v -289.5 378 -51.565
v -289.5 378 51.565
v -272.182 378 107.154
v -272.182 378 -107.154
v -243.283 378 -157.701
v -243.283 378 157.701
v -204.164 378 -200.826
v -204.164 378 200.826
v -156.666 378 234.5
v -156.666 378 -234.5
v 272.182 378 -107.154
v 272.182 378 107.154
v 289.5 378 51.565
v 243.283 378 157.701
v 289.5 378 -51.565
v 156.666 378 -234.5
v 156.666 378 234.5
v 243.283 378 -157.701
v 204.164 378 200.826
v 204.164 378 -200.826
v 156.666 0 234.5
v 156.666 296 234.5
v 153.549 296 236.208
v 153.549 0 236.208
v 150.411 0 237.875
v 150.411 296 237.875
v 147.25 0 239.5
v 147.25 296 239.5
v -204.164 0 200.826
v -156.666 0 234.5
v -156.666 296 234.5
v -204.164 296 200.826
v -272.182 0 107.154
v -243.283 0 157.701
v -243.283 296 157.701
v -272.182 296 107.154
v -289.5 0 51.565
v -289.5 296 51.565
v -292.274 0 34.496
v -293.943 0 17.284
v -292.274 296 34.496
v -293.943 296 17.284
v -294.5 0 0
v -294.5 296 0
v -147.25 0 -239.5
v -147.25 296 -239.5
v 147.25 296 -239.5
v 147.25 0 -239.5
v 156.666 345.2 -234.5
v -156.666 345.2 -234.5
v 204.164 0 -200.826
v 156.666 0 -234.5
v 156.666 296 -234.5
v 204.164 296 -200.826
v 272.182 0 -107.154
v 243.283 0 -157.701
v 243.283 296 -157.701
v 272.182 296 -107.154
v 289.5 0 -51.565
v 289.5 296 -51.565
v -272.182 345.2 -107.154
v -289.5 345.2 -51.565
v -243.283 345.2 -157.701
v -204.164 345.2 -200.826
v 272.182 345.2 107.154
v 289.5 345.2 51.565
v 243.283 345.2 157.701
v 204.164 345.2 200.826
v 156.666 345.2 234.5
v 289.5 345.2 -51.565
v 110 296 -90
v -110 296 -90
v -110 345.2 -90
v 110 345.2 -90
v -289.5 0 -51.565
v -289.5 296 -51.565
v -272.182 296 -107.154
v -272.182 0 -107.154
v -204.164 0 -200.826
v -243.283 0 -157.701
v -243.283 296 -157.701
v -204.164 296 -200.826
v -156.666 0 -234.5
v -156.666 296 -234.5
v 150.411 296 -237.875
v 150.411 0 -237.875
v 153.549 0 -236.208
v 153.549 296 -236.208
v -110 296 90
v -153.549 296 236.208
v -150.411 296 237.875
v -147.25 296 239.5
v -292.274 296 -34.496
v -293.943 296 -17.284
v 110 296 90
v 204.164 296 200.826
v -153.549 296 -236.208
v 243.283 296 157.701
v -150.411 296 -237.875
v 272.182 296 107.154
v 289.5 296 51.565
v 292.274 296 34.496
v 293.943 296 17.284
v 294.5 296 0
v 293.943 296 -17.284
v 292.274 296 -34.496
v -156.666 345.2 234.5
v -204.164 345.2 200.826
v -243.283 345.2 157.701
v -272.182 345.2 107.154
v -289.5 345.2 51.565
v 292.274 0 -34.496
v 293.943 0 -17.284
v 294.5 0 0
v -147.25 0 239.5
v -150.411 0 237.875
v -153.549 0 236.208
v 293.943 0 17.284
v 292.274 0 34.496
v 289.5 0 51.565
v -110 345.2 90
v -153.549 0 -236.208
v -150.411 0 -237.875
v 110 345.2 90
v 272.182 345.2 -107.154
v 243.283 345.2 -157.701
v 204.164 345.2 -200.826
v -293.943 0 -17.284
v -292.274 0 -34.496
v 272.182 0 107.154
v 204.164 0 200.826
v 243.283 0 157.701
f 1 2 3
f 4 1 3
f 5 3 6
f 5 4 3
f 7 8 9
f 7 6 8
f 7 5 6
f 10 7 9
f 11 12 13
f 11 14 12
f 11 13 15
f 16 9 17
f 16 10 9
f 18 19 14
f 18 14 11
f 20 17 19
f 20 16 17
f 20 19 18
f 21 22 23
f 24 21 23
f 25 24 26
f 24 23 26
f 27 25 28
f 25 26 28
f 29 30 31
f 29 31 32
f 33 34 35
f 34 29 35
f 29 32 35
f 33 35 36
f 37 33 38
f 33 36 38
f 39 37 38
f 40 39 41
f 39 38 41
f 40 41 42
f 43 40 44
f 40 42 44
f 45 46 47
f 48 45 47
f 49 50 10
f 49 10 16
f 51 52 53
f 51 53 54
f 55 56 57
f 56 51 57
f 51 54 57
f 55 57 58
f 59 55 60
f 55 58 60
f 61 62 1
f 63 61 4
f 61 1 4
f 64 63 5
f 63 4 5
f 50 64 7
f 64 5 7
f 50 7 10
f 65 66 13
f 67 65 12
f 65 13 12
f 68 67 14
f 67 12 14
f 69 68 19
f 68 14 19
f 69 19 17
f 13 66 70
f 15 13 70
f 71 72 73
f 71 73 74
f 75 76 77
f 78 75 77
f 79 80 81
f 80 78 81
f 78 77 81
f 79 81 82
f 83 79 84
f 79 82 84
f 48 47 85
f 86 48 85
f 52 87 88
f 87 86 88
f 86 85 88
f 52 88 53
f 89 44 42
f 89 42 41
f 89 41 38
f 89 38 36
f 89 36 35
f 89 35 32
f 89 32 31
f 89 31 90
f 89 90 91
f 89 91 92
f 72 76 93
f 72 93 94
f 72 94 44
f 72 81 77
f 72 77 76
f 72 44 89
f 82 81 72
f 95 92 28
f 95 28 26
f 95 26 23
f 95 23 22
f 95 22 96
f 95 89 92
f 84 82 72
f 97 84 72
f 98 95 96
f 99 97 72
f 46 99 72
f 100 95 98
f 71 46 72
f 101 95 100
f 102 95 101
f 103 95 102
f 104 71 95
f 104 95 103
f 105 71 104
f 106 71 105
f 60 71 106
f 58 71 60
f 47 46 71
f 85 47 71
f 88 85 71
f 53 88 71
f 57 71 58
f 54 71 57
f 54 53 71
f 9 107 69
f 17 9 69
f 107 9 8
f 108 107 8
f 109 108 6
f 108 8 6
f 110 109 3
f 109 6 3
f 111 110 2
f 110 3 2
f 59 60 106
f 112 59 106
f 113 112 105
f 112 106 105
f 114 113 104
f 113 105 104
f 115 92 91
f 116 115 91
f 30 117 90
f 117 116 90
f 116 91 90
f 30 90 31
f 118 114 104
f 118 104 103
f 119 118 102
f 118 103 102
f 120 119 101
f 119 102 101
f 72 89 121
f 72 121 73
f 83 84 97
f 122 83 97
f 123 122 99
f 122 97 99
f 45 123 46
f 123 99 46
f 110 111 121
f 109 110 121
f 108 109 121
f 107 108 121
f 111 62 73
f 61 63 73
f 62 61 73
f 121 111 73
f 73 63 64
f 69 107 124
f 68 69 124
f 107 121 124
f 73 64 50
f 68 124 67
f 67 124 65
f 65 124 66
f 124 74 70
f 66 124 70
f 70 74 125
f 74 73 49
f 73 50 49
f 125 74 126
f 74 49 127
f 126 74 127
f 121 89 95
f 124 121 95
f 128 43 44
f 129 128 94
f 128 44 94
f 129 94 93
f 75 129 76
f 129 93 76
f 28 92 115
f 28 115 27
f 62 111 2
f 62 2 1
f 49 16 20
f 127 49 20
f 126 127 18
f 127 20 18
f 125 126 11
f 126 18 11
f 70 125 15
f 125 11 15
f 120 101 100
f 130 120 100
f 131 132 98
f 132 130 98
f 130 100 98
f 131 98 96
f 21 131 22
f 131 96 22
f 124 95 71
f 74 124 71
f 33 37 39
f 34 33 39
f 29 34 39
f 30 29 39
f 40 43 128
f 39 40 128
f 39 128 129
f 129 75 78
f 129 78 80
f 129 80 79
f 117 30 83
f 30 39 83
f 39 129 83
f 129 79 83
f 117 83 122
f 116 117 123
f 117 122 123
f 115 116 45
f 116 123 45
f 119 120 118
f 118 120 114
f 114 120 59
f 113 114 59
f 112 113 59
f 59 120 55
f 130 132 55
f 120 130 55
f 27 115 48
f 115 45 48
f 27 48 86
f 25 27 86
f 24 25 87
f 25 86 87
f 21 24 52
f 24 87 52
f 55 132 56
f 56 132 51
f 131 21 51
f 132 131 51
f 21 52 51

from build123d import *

# Parameters (mm, degrees)
ESBO_O1_W                = 589
ESBO_O1_H                = 479
RESSALTO_EXTRUS_O1_DEPTH = 296
ESBO_O2_W                = 220
ESBO_O2_H                = 180
RESSALTO_EXTRUS_O2_DEPTH = 49.2
ESBO_O3_W                = 579
ESBO_O3_H                = 469
RESSALTO_EXTRUS_O3_DEPTH = 32.8
CORTE_EXTRUS_O1_REACH    = 537.7


with BuildPart() as part:
    # Esboço1 → Ressalto-extrusão1 (new body)
    with BuildSketch(Plane(origin=(0, 0, 0), x_dir=(1, 0, 0), z_dir=(0, 1, 0))):
        Rectangle(ESBO_O1_W, ESBO_O1_H)
    extrude(amount=RESSALTO_EXTRUS_O1_DEPTH)

    # Esboço2 → Ressalto-extrusão2 (add)
    with BuildSketch(Plane(origin=(0, 296, 0), x_dir=(1, 0, 0), z_dir=(0, 1, 0))):
        Rectangle(ESBO_O2_W, ESBO_O2_H)
    extrude(amount=RESSALTO_EXTRUS_O2_DEPTH)

    # Esboço3 → Ressalto-extrusão3 (add)
    with BuildSketch(Plane(origin=(0, 345.2, 0), x_dir=(1, 0, 0), z_dir=(0, 1, 0))):
        Rectangle(ESBO_O3_W, ESBO_O3_H)
    extrude(amount=RESSALTO_EXTRUS_O3_DEPTH)

    # Corte-extrusão1: up to this face of the body (flat: up to its plane)
    corte_extrus_o1_end = Plane(part.part.faces().sort_by_distance((0, 0, 0))[0])
    # Esboço4 → Corte-extrusão1 (cut, up to the picked face)
    with BuildSketch(Plane(origin=(0, 378, 0), x_dir=(1, 0, 0), z_dir=(0, 1, 0)), mode=Mode.PRIVATE) as corte_extrus_o1_sk1:
        with BuildLine():
            ThreePointArc((-156.665637301, -234.5), (-243.283458342, -157.700862236), (-289.5, -51.565167202))
            Line((-289.5, -51.565167202), (-289.5, -234.5))
            Line((-289.5, -234.5), (-156.665637301, -234.5))
        make_face()
    corte_extrus_o1_tool1 = split(extrude(corte_extrus_o1_sk1.sketch, amount=-CORTE_EXTRUS_O1_REACH, mode=Mode.PRIVATE), bisect_by=corte_extrus_o1_end, keep=Keep.BOTH, mode=Mode.PRIVATE)
    # Esboço4 → Corte-extrusão1 (cut, up to the picked face)
    with BuildSketch(Plane(origin=(0, 378, 0), x_dir=(1, 0, 0), z_dir=(0, 1, 0)), mode=Mode.PRIVATE) as corte_extrus_o1_sk2:
        with BuildLine():
            ThreePointArc((-289.5, 51.565167202), (-243.283458342, 157.700862236), (-156.665637301, 234.5))
            Line((-156.665637301, 234.5), (-289.5, 234.5))
            Line((-289.5, 234.5), (-289.5, 51.565167202))
        make_face()
    corte_extrus_o1_tool2 = split(extrude(corte_extrus_o1_sk2.sketch, amount=-CORTE_EXTRUS_O1_REACH, mode=Mode.PRIVATE), bisect_by=corte_extrus_o1_end, keep=Keep.BOTH, mode=Mode.PRIVATE)
    # Esboço4 → Corte-extrusão1 (cut, up to the picked face)
    with BuildSketch(Plane(origin=(0, 378, 0), x_dir=(1, 0, 0), z_dir=(0, 1, 0)), mode=Mode.PRIVATE) as corte_extrus_o1_sk3:
        with BuildLine():
            Line((289.5, 234.5), (156.665637301, 234.5))
            ThreePointArc((156.665637301, 234.5), (243.283458342, 157.700862236), (289.5, 51.565167202))
            Line((289.5, 51.565167202), (289.5, 234.5))
        make_face()
    corte_extrus_o1_tool3 = split(extrude(corte_extrus_o1_sk3.sketch, amount=-CORTE_EXTRUS_O1_REACH, mode=Mode.PRIVATE), bisect_by=corte_extrus_o1_end, keep=Keep.BOTH, mode=Mode.PRIVATE)
    # Esboço4 → Corte-extrusão1 (cut, up to the picked face)
    with BuildSketch(Plane(origin=(0, 378, 0), x_dir=(1, 0, 0), z_dir=(0, 1, 0)), mode=Mode.PRIVATE) as corte_extrus_o1_sk4:
        with BuildLine():
            Line((289.5, -234.5), (289.5, -51.565167202))
            ThreePointArc((289.5, -51.565167202), (243.283458342, -157.700862236), (156.665637301, -234.5))
            Line((156.665637301, -234.5), (289.5, -234.5))
        make_face()
    corte_extrus_o1_tool4 = split(extrude(corte_extrus_o1_sk4.sketch, amount=-CORTE_EXTRUS_O1_REACH, mode=Mode.PRIVATE), bisect_by=corte_extrus_o1_end, keep=Keep.BOTH, mode=Mode.PRIVATE)
    # Esboço4 → Corte-extrusão1 (cut, up to the picked face)
    with BuildSketch(Plane(origin=(0, 378, 0), x_dir=(1, 0, 0), z_dir=(0, 1, 0)), mode=Mode.PRIVATE) as corte_extrus_o1_sk5:
        with BuildLine():
            ThreePointArc((147.25, 239.5), (151.982646469, 237.046753946), (156.665637301, 234.5))
            Line((156.665637301, 234.5), (289.5, 234.5))
            Line((289.5, 234.5), (289.5, 51.565167202))
            ThreePointArc((289.5, 51.565167202), (293.247075515, 25.903506357), (294.5, 9.48e-07))
            Line((294.5, 9.48e-07), (294.5, 239.5))
            Line((294.5, 239.5), (147.25, 239.5))
        make_face()
    corte_extrus_o1_tool5 = split(extrude(corte_extrus_o1_sk5.sketch, amount=-CORTE_EXTRUS_O1_REACH, mode=Mode.PRIVATE), bisect_by=corte_extrus_o1_end, keep=Keep.BOTH, mode=Mode.PRIVATE)
    # Esboço4 → Corte-extrusão1 (cut, up to the picked face)
    with BuildSketch(Plane(origin=(0, 378, 0), x_dir=(1, 0, 0), z_dir=(0, 1, 0)), mode=Mode.PRIVATE) as corte_extrus_o1_sk6:
        with BuildLine():
            Line((294.5, -239.5), (294.5, 9.48e-07))
            ThreePointArc((294.5, 9.48e-07), (293.247075606, -25.903505414), (289.5, -51.565167202))
            Line((289.5, -51.565167202), (289.5, -234.5))
            Line((289.5, -234.5), (156.665637301, -234.5))
            ThreePointArc((156.665637301, -234.5), (151.982646469, -237.046753946), (147.25, -239.5))
            Line((147.25, -239.5), (294.5, -239.5))
        make_face()
    corte_extrus_o1_tool6 = split(extrude(corte_extrus_o1_sk6.sketch, amount=-CORTE_EXTRUS_O1_REACH, mode=Mode.PRIVATE), bisect_by=corte_extrus_o1_end, keep=Keep.BOTH, mode=Mode.PRIVATE)
    # Esboço4 → Corte-extrusão1 (cut, up to the picked face)
    with BuildSketch(Plane(origin=(0, 378, 0), x_dir=(1, 0, 0), z_dir=(0, 1, 0)), mode=Mode.PRIVATE) as corte_extrus_o1_sk7:
        with BuildLine():
            ThreePointArc((-289.5, -51.565167202), (-293.24707556, -25.903505885), (-294.5, 0))
            Line((-294.5, 0), (-294.5, -239.5))
            Line((-294.5, -239.5), (-147.25, -239.5))
            ThreePointArc((-147.25, -239.5), (-151.982646469, -237.046753946), (-156.665637301, -234.5))
            Line((-156.665637301, -234.5), (-289.5, -234.5))
            Line((-289.5, -234.5), (-289.5, -51.565167202))
        make_face()
    corte_extrus_o1_tool7 = split(extrude(corte_extrus_o1_sk7.sketch, amount=-CORTE_EXTRUS_O1_REACH, mode=Mode.PRIVATE), bisect_by=corte_extrus_o1_end, keep=Keep.BOTH, mode=Mode.PRIVATE)
    # Esboço4 → Corte-extrusão1 (cut, up to the picked face)
    with BuildSketch(Plane(origin=(0, 378, 0), x_dir=(1, 0, 0), z_dir=(0, 1, 0)), mode=Mode.PRIVATE) as corte_extrus_o1_sk8:
        with BuildLine():
            ThreePointArc((-156.665637301, 234.5), (-151.982646469, 237.046753946), (-147.25, 239.5))
            Line((-147.25, 239.5), (-294.5, 239.5))
            Line((-294.5, 239.5), (-294.5, 0))
            ThreePointArc((-294.5, 0), (-293.24707556, 25.903505885), (-289.5, 51.565167202))
            Line((-289.5, 51.565167202), (-289.5, 234.5))
            Line((-289.5, 234.5), (-156.665637301, 234.5))
        make_face()
    corte_extrus_o1_tool8 = split(extrude(corte_extrus_o1_sk8.sketch, amount=-CORTE_EXTRUS_O1_REACH, mode=Mode.PRIVATE), bisect_by=corte_extrus_o1_end, keep=Keep.BOTH, mode=Mode.PRIVATE)
    add(corte_extrus_o1_tool1.solids().sort_by(Axis((-251.602427, 378, 184.711706), (0, -1, 0)))[0], mode=Mode.SUBTRACT)
    add(corte_extrus_o1_tool2.solids().sort_by(Axis((-251.602427, 378, -184.711706), (0, -1, 0)))[0], mode=Mode.SUBTRACT)
    add(corte_extrus_o1_tool3.solids().sort_by(Axis((251.602427, 378, -184.711706), (0, -1, 0)))[0], mode=Mode.SUBTRACT)
    add(corte_extrus_o1_tool4.solids().sort_by(Axis((251.602427, 378, 184.711706), (0, -1, 0)))[0], mode=Mode.SUBTRACT)
    add(corte_extrus_o1_tool5.solids().sort_by(Axis((152.114505, 378, -237.29506), (0, -1, 0)))[0], mode=Mode.SUBTRACT)
    add(corte_extrus_o1_tool6.solids().sort_by(Axis((220.875, 378, 236.688545), (0, -1, 0)))[0], mode=Mode.SUBTRACT)
    add(corte_extrus_o1_tool7.solids().sort_by(Axis((-293.526909, 378, 25.93064), (0, -1, 0)))[0], mode=Mode.SUBTRACT)
    add(corte_extrus_o1_tool8.solids().sort_by(Axis((-292.311455, 378, -143.032584), (0, -1, 0)))[0], mode=Mode.SUBTRACT)


solid = part.part
